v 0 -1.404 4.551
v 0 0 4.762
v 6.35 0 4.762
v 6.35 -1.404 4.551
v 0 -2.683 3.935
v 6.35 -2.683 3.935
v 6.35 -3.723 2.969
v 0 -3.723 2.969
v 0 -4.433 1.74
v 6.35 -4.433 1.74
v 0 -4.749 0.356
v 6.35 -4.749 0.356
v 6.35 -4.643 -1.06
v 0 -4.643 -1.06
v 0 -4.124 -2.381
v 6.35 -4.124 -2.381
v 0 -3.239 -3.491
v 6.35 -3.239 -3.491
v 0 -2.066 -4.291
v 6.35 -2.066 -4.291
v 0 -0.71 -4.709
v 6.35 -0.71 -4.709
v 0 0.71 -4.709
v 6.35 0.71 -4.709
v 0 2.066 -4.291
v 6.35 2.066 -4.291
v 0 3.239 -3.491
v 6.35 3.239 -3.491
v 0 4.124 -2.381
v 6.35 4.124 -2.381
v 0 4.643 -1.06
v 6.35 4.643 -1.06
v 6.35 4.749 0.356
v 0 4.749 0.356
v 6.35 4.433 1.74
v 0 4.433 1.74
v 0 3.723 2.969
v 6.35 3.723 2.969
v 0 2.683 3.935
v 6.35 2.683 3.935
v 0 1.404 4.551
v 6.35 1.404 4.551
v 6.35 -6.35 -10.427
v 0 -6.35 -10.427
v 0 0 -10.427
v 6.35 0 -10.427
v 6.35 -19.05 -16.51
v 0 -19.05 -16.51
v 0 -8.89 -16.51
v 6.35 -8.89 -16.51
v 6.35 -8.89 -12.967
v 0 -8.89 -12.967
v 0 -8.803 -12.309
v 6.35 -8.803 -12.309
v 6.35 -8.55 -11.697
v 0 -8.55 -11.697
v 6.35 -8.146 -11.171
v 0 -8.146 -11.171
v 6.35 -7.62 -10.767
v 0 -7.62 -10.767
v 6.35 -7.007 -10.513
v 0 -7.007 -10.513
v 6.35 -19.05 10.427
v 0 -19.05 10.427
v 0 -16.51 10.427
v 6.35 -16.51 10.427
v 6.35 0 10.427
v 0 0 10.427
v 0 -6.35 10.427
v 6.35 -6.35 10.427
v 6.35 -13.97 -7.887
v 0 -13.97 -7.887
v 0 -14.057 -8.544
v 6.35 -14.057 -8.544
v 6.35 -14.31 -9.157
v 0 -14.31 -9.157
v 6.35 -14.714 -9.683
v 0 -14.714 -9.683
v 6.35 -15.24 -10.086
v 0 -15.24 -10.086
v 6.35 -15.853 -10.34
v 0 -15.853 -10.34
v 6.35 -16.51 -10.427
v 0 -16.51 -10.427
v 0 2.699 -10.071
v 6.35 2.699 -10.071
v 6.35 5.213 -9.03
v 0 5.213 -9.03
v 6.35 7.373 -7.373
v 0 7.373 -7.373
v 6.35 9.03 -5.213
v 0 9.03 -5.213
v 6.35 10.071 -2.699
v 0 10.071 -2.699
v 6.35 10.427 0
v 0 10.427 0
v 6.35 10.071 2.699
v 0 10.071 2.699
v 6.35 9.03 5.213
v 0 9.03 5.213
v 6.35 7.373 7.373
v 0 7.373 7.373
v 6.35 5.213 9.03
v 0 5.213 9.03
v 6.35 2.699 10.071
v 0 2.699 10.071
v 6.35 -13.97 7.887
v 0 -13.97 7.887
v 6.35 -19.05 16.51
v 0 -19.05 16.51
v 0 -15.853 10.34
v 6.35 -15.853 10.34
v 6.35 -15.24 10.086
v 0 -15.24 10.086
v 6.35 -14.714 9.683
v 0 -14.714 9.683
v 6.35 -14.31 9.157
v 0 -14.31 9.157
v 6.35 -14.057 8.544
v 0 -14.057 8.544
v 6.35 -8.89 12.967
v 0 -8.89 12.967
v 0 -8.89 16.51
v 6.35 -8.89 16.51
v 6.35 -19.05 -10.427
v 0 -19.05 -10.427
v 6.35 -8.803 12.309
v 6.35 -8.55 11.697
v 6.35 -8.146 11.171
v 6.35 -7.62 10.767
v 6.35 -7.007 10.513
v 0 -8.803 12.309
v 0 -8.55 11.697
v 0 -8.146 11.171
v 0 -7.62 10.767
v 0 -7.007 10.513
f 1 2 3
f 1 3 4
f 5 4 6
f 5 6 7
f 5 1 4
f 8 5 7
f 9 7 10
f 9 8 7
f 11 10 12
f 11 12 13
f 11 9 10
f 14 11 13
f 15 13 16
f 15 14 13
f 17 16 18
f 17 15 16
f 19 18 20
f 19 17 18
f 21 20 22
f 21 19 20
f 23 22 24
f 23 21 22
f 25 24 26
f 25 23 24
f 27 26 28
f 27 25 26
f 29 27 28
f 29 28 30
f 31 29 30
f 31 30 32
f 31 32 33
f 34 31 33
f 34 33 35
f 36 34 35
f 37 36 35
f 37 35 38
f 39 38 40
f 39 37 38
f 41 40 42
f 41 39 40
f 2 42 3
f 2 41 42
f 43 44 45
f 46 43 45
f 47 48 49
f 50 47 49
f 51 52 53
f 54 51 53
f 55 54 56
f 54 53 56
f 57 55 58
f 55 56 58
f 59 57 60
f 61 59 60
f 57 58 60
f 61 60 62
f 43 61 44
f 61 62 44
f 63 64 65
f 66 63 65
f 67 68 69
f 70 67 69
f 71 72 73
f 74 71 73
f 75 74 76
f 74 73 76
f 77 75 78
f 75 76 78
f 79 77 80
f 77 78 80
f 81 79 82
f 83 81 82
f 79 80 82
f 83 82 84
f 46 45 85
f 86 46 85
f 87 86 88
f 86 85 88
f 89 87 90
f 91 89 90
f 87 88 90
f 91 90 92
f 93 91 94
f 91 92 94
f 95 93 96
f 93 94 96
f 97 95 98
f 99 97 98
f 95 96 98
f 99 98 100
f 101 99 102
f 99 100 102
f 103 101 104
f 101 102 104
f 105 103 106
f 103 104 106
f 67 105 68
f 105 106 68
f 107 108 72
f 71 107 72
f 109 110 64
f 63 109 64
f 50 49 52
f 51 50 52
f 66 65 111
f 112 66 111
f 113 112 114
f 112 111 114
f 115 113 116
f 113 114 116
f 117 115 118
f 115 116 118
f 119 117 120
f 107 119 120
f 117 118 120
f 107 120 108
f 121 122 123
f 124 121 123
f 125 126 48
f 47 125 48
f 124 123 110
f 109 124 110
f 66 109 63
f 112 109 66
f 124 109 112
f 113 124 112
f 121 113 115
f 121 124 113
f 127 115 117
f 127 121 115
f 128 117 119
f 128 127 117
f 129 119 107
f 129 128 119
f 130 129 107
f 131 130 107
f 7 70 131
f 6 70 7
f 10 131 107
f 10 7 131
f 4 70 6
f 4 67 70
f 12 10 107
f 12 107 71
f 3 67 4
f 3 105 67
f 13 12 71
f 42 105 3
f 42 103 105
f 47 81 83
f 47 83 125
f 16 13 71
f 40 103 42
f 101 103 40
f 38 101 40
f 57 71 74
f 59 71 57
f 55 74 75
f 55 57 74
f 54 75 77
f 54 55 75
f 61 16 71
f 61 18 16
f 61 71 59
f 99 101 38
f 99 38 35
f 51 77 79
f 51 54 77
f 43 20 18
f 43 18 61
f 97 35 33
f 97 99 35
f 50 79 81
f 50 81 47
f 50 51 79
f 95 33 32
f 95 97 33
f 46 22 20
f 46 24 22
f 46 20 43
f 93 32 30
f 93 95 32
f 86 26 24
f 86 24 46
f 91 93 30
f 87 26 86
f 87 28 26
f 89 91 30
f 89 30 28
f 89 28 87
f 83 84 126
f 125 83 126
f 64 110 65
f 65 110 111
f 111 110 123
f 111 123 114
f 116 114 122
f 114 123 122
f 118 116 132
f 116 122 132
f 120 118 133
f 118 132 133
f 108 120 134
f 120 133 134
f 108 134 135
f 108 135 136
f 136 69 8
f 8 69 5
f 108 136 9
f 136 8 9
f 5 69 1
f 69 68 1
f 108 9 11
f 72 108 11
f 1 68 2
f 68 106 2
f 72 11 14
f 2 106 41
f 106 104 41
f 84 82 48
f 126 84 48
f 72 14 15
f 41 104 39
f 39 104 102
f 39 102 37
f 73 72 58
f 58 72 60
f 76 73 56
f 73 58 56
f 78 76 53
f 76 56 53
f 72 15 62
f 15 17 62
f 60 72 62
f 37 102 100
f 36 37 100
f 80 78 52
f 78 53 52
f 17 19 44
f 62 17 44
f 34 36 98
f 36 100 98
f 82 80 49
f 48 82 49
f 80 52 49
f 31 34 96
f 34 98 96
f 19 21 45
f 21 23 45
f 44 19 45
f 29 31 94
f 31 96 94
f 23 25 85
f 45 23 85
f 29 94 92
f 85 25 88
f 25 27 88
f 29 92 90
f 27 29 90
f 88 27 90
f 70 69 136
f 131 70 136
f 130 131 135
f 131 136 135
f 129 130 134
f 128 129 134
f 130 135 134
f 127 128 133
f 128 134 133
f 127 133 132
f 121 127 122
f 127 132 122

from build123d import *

# Parameters (mm, degrees)
SKETCH1_R           = 4.7625
BOSS_EXTRUDE1_DEPTH = 6.35


with BuildPart() as part:
    # Sketch1 → Boss-Extrude1 (new body)
    with BuildSketch(Plane(origin=(0, 0, 0), x_dir=(0, 0, -1), z_dir=(1, 0, 0))):
        with BuildLine():
            Line((-16.51, -19.05), (-10.4267, -19.05))
            Line((-10.4267, -19.05), (-10.4267, -16.51))
            ThreePointArc((-10.4267, -16.51), (-9.682751224, -14.713948776), (-7.8867, -13.97))
            Line((-7.8867, -13.97), (7.8867, -13.97))
            ThreePointArc((7.8867, -13.97), (9.682751224, -14.713948776), (10.4267, -16.51))
            Line((10.4267, -16.51), (10.4267, -19.05))
            Line((10.4267, -19.05), (16.51, -19.05))
            Line((16.51, -19.05), (16.51, -8.89))
            Line((16.51, -8.89), (12.9667, -8.89))
            ThreePointArc((12.9667, -8.89), (11.170648776, -8.146051224), (10.4267, -6.35))
            Line((10.4267, -6.35), (10.4267, 0))
            ThreePointArc((10.4267, 0), (0, 10.4267), (-10.4267, 0))
            Line((-10.4267, 0), (-10.4267, -6.35))
            ThreePointArc((-10.4267, -6.35), (-11.170648776, -8.146051224), (-12.9667, -8.89))
            Line((-12.9667, -8.89), (-16.51, -8.89))
            Line((-16.51, -8.89), (-16.51, -19.05))
        make_face()
        with Locations(Location((0, 0, 0), (0, 0, 180))):
            Circle(SKETCH1_R, mode=Mode.SUBTRACT)
    extrude(amount=BOSS_EXTRUDE1_DEPTH)


solid = part.part
